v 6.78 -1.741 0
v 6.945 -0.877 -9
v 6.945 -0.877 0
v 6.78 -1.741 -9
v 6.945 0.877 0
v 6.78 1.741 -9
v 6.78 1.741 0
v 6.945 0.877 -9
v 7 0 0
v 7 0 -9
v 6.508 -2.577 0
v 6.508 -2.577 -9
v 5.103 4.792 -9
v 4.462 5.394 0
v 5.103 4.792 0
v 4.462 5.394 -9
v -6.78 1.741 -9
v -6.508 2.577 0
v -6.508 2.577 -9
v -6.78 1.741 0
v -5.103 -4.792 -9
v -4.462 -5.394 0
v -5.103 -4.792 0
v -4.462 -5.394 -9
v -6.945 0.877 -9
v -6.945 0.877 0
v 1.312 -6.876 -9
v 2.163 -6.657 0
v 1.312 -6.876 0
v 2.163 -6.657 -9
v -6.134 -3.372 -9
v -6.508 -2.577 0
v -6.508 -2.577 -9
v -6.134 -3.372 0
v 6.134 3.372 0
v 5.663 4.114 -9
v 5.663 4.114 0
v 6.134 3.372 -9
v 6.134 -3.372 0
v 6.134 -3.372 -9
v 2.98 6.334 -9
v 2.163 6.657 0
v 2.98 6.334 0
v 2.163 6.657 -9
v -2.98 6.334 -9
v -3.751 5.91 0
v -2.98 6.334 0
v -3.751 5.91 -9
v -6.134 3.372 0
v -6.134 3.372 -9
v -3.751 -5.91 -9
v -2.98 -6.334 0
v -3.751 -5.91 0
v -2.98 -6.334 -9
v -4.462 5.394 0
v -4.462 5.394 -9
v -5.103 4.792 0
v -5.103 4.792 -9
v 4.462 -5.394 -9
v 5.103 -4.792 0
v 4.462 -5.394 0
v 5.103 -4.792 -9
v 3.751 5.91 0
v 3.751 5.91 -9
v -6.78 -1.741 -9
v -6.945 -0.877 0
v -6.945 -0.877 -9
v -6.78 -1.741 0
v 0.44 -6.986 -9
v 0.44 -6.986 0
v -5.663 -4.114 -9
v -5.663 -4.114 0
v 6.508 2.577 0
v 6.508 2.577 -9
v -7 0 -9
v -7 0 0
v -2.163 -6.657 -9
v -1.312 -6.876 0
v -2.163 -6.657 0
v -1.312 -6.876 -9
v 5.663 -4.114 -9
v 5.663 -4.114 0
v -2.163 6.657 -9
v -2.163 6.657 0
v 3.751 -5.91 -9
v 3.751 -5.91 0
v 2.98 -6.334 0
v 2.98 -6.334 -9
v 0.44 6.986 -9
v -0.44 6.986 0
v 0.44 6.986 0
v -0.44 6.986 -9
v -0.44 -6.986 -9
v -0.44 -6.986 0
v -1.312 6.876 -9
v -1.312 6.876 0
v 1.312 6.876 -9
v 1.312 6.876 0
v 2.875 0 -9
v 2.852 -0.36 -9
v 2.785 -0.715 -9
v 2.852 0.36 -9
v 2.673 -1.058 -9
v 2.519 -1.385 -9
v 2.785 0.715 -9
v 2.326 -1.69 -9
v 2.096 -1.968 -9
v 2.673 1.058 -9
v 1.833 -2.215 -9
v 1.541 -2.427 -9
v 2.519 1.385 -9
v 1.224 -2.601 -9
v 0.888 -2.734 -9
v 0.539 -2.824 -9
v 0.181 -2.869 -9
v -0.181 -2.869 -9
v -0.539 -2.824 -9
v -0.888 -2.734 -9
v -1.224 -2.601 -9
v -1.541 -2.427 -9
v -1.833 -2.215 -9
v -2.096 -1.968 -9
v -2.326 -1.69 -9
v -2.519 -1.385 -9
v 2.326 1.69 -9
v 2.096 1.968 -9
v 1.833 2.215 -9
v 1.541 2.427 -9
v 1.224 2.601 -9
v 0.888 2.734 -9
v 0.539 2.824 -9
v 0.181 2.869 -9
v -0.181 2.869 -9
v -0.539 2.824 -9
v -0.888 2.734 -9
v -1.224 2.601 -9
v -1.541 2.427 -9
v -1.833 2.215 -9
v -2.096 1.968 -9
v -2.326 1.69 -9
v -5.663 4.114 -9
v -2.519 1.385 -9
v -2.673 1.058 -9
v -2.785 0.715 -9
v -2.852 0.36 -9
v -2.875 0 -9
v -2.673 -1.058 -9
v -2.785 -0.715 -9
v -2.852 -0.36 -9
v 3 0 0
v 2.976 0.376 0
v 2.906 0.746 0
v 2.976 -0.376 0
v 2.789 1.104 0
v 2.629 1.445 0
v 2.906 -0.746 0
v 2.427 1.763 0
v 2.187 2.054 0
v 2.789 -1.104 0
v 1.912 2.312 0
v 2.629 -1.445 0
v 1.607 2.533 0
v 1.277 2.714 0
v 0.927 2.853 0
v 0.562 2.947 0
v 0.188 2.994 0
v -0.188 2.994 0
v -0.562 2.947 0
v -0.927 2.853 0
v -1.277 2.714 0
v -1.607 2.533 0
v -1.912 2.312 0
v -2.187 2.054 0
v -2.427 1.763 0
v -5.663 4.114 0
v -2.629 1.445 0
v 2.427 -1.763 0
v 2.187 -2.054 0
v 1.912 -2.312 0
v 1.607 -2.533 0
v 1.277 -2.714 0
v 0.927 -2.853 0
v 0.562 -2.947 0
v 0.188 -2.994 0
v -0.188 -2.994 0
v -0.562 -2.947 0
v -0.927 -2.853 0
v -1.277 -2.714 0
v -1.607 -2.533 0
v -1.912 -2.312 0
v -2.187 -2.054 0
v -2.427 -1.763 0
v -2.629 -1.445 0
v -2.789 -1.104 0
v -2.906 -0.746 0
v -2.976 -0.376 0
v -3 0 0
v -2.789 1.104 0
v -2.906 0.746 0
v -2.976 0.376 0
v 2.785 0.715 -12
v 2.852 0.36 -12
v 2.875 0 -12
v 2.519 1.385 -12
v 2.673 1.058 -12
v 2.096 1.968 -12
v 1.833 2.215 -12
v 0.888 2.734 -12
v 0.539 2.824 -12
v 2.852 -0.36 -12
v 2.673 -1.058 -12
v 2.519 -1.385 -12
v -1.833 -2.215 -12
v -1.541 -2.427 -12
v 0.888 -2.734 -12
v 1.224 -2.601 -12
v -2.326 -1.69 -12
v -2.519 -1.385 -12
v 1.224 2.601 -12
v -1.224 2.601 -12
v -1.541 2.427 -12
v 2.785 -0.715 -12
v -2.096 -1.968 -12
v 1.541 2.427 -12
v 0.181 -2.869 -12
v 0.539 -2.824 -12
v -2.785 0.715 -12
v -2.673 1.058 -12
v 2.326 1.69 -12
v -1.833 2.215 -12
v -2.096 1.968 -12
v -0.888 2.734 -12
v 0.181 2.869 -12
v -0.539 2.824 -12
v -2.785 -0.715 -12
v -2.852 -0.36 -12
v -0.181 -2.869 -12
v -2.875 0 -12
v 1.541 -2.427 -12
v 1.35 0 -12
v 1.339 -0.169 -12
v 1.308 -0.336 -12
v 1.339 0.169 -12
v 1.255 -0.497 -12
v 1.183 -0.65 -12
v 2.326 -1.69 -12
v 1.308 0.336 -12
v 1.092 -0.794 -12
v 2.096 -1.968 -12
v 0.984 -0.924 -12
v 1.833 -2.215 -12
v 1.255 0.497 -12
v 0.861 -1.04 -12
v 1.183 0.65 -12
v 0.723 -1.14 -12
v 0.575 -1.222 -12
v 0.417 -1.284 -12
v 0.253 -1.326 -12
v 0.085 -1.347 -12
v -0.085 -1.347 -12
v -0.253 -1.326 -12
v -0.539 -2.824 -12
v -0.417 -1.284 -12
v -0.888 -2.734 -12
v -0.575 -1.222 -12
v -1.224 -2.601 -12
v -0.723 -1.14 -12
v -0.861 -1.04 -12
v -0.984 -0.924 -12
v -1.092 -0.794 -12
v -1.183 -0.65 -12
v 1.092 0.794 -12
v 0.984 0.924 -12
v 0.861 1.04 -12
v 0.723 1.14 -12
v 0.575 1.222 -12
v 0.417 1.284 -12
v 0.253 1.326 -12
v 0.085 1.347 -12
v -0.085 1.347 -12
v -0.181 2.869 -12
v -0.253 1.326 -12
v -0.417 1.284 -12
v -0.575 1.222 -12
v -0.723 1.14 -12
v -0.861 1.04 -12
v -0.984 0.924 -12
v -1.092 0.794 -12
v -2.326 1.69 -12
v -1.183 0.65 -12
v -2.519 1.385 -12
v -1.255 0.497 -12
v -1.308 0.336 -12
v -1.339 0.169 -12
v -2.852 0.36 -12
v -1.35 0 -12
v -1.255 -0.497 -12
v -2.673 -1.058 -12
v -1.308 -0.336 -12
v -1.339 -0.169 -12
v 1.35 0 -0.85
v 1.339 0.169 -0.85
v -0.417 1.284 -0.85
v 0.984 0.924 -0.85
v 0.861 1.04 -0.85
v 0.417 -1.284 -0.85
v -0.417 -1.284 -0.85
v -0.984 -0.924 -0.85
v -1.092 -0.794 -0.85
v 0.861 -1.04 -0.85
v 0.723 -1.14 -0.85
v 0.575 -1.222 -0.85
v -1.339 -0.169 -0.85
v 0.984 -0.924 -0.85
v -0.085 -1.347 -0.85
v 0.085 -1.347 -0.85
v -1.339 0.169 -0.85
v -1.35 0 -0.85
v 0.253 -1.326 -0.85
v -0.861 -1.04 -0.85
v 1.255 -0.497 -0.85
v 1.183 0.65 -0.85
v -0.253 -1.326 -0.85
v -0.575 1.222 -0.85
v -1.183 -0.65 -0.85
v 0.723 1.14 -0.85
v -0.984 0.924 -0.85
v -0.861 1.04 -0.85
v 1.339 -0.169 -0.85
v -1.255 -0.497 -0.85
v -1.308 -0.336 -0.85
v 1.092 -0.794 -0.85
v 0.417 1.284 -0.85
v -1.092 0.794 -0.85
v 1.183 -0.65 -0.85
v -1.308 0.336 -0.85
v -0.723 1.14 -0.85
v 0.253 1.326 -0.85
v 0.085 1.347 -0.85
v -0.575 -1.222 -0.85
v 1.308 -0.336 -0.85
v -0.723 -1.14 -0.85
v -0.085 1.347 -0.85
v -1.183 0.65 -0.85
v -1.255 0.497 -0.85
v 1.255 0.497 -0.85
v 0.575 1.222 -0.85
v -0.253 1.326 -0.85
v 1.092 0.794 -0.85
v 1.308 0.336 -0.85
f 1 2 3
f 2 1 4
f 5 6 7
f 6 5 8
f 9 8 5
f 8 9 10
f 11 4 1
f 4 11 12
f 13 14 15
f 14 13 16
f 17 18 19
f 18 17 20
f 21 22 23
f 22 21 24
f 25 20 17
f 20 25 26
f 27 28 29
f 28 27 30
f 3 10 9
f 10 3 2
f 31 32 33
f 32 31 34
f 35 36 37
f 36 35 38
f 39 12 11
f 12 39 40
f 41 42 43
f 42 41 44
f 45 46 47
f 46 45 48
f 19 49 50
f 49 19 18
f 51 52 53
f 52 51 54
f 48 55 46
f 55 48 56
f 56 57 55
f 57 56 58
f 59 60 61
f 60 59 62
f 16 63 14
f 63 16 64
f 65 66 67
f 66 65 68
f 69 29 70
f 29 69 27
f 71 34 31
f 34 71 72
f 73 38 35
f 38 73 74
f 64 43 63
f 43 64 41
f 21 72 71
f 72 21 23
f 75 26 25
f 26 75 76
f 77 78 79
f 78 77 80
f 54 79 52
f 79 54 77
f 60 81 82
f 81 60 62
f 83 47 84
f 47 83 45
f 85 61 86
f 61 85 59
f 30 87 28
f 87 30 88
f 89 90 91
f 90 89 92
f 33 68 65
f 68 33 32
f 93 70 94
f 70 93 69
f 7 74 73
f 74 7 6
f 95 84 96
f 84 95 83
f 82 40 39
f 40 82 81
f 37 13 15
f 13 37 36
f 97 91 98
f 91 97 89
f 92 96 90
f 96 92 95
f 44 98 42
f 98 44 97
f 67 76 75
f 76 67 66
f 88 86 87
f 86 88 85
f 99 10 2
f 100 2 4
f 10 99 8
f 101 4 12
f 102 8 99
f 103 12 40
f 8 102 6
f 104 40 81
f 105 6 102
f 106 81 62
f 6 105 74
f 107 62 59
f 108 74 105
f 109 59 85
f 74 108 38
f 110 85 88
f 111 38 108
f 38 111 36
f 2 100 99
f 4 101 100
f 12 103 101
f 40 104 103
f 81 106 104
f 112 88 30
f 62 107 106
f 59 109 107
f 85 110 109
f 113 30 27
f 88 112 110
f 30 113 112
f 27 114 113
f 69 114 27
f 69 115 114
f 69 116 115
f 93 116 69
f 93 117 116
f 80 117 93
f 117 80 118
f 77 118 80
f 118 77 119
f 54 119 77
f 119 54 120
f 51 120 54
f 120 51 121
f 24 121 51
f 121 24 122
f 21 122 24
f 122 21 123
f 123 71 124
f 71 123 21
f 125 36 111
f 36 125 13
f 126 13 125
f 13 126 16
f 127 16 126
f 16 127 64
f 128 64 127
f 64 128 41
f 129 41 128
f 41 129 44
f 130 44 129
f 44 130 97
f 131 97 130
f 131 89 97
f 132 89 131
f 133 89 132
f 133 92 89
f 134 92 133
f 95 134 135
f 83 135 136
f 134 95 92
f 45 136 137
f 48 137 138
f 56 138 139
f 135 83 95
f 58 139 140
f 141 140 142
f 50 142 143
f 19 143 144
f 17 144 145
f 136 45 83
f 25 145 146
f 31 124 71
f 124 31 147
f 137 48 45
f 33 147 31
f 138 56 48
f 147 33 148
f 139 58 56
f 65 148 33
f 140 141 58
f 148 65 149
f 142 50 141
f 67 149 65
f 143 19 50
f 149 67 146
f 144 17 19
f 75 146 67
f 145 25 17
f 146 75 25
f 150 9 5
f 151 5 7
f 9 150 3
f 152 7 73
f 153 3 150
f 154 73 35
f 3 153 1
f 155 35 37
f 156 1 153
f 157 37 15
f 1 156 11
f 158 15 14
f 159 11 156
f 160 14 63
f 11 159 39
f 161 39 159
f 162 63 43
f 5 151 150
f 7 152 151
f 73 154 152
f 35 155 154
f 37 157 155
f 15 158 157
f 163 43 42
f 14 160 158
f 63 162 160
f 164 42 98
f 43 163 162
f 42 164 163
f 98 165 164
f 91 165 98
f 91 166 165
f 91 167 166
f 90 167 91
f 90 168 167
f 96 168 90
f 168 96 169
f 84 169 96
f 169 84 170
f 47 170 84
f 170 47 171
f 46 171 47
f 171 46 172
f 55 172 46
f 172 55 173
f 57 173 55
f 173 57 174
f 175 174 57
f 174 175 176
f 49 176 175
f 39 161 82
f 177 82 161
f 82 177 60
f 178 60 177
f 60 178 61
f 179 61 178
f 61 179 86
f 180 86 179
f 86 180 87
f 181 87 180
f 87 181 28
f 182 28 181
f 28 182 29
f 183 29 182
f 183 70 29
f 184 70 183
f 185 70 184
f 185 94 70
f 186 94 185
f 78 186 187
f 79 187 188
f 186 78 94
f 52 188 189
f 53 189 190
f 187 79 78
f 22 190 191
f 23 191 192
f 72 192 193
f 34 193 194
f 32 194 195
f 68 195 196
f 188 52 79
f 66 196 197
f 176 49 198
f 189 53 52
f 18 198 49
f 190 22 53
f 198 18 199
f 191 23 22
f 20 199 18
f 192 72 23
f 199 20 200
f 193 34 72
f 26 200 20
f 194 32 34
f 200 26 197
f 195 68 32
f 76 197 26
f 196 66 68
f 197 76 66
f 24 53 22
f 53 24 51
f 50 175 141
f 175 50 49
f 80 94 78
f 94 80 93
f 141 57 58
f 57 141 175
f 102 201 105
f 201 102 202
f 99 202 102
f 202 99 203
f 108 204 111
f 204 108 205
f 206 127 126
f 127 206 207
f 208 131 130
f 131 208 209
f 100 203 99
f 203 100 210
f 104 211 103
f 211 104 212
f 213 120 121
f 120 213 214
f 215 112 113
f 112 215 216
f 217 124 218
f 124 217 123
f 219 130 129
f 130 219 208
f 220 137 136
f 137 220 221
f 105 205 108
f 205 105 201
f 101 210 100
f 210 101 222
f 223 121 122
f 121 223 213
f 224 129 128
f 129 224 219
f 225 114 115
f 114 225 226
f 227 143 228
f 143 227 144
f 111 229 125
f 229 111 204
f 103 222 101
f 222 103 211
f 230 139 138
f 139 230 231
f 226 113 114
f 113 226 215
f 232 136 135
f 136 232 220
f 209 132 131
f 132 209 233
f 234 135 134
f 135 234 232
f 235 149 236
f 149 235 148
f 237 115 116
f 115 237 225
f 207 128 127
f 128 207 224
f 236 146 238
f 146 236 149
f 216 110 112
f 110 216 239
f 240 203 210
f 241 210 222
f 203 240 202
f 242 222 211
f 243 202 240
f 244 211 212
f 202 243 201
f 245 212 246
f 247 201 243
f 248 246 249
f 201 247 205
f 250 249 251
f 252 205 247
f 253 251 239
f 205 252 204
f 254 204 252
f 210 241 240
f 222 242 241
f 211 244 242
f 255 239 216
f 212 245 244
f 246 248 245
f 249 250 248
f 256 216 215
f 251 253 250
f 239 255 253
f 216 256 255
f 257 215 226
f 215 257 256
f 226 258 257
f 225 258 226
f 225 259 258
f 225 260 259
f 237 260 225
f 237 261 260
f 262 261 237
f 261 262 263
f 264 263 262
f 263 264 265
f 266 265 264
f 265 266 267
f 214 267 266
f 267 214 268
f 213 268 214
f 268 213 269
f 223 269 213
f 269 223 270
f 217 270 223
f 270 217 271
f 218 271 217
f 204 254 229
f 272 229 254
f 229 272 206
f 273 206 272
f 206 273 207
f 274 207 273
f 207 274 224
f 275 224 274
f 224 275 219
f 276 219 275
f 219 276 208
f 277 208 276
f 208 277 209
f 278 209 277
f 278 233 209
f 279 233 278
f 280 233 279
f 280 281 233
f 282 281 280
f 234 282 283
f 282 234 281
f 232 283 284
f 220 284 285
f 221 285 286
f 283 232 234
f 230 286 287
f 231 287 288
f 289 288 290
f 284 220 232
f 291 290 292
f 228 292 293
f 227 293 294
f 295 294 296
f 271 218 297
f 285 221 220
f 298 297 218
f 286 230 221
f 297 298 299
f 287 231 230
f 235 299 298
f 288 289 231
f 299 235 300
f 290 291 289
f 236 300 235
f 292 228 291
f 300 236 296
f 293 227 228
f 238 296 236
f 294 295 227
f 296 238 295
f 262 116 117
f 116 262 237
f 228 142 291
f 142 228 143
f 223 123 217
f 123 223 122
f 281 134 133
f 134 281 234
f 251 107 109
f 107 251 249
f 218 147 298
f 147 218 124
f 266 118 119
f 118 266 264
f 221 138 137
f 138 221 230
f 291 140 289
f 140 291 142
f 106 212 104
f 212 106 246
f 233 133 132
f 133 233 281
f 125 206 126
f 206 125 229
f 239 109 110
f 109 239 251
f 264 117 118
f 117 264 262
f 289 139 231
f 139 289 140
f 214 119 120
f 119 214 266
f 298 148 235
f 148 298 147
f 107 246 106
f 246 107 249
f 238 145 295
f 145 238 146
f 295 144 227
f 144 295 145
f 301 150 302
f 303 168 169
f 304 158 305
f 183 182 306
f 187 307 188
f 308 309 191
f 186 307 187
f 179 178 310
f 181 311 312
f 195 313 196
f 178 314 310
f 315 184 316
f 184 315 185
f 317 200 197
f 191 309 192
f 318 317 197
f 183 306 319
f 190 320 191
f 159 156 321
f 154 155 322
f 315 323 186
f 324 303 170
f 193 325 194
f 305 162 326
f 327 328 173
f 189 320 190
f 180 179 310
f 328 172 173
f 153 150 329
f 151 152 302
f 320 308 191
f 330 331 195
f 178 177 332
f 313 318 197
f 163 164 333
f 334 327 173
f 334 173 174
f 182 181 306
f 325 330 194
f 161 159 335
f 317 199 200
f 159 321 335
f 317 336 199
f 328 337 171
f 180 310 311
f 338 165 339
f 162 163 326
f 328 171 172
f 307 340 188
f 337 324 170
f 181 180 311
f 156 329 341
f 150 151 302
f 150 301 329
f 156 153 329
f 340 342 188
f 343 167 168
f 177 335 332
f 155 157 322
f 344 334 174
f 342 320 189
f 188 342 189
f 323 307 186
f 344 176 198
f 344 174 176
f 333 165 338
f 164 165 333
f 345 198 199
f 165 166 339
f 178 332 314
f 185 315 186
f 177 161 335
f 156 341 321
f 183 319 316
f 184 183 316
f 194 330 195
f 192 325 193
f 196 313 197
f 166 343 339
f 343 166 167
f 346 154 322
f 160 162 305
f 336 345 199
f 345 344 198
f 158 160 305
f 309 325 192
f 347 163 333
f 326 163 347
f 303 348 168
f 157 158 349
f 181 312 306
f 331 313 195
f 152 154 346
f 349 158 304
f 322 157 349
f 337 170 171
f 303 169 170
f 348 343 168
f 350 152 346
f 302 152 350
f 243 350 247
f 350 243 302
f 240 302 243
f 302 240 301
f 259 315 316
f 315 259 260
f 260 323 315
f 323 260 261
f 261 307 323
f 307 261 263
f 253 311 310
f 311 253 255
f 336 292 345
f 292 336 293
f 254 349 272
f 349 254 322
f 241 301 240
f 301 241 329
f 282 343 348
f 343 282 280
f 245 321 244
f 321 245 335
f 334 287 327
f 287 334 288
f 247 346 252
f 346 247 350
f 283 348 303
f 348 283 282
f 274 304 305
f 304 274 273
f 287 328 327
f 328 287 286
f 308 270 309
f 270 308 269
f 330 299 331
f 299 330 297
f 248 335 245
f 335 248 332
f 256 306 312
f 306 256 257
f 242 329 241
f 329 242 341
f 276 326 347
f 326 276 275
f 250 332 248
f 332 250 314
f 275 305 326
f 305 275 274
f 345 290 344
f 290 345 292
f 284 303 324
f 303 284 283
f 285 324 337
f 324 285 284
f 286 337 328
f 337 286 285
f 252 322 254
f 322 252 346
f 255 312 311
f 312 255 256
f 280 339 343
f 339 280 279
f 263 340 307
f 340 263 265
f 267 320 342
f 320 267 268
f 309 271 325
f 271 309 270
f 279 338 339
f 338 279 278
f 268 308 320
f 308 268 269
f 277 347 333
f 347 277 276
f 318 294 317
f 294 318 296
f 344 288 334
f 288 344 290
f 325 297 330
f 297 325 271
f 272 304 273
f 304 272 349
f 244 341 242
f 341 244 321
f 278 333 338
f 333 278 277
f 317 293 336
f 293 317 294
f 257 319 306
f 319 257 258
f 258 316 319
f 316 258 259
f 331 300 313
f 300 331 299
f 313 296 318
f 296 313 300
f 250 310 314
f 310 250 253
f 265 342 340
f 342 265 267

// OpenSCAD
$fn = 50;

difference() {
	union() {
		translate(v = [0, 0, -9.0]) {
			cylinder(h = 9, r = 7.0);
		}
		#translate(v = [0, 0, -12.0]) {
			cylinder(h = 12, r = 2.875);
		}
	}
	union() {
		translate(v = [0, 0, 0]) {
			rotate(a = [0, 0, 0]) {
				difference() {
					union() {
						translate(v = [0, 0, -12.0]) {
							cylinder(h = 12, r = 1.0);
						}
						translate(v = [0, 0, -0.85]) {
							cylinder(h = 0.85, r1 = 1.35, r2 = 3.0);
						}
						translate(v = [0, 0, -12.0]) {
							cylinder(h = 12, r = 1.35);
						}
						translate(v = [0, 0, -12.0]) {
							cylinder(h = 12, r = 1.0);
						}
					}
					union();
				}
			}
		}
	}
}
